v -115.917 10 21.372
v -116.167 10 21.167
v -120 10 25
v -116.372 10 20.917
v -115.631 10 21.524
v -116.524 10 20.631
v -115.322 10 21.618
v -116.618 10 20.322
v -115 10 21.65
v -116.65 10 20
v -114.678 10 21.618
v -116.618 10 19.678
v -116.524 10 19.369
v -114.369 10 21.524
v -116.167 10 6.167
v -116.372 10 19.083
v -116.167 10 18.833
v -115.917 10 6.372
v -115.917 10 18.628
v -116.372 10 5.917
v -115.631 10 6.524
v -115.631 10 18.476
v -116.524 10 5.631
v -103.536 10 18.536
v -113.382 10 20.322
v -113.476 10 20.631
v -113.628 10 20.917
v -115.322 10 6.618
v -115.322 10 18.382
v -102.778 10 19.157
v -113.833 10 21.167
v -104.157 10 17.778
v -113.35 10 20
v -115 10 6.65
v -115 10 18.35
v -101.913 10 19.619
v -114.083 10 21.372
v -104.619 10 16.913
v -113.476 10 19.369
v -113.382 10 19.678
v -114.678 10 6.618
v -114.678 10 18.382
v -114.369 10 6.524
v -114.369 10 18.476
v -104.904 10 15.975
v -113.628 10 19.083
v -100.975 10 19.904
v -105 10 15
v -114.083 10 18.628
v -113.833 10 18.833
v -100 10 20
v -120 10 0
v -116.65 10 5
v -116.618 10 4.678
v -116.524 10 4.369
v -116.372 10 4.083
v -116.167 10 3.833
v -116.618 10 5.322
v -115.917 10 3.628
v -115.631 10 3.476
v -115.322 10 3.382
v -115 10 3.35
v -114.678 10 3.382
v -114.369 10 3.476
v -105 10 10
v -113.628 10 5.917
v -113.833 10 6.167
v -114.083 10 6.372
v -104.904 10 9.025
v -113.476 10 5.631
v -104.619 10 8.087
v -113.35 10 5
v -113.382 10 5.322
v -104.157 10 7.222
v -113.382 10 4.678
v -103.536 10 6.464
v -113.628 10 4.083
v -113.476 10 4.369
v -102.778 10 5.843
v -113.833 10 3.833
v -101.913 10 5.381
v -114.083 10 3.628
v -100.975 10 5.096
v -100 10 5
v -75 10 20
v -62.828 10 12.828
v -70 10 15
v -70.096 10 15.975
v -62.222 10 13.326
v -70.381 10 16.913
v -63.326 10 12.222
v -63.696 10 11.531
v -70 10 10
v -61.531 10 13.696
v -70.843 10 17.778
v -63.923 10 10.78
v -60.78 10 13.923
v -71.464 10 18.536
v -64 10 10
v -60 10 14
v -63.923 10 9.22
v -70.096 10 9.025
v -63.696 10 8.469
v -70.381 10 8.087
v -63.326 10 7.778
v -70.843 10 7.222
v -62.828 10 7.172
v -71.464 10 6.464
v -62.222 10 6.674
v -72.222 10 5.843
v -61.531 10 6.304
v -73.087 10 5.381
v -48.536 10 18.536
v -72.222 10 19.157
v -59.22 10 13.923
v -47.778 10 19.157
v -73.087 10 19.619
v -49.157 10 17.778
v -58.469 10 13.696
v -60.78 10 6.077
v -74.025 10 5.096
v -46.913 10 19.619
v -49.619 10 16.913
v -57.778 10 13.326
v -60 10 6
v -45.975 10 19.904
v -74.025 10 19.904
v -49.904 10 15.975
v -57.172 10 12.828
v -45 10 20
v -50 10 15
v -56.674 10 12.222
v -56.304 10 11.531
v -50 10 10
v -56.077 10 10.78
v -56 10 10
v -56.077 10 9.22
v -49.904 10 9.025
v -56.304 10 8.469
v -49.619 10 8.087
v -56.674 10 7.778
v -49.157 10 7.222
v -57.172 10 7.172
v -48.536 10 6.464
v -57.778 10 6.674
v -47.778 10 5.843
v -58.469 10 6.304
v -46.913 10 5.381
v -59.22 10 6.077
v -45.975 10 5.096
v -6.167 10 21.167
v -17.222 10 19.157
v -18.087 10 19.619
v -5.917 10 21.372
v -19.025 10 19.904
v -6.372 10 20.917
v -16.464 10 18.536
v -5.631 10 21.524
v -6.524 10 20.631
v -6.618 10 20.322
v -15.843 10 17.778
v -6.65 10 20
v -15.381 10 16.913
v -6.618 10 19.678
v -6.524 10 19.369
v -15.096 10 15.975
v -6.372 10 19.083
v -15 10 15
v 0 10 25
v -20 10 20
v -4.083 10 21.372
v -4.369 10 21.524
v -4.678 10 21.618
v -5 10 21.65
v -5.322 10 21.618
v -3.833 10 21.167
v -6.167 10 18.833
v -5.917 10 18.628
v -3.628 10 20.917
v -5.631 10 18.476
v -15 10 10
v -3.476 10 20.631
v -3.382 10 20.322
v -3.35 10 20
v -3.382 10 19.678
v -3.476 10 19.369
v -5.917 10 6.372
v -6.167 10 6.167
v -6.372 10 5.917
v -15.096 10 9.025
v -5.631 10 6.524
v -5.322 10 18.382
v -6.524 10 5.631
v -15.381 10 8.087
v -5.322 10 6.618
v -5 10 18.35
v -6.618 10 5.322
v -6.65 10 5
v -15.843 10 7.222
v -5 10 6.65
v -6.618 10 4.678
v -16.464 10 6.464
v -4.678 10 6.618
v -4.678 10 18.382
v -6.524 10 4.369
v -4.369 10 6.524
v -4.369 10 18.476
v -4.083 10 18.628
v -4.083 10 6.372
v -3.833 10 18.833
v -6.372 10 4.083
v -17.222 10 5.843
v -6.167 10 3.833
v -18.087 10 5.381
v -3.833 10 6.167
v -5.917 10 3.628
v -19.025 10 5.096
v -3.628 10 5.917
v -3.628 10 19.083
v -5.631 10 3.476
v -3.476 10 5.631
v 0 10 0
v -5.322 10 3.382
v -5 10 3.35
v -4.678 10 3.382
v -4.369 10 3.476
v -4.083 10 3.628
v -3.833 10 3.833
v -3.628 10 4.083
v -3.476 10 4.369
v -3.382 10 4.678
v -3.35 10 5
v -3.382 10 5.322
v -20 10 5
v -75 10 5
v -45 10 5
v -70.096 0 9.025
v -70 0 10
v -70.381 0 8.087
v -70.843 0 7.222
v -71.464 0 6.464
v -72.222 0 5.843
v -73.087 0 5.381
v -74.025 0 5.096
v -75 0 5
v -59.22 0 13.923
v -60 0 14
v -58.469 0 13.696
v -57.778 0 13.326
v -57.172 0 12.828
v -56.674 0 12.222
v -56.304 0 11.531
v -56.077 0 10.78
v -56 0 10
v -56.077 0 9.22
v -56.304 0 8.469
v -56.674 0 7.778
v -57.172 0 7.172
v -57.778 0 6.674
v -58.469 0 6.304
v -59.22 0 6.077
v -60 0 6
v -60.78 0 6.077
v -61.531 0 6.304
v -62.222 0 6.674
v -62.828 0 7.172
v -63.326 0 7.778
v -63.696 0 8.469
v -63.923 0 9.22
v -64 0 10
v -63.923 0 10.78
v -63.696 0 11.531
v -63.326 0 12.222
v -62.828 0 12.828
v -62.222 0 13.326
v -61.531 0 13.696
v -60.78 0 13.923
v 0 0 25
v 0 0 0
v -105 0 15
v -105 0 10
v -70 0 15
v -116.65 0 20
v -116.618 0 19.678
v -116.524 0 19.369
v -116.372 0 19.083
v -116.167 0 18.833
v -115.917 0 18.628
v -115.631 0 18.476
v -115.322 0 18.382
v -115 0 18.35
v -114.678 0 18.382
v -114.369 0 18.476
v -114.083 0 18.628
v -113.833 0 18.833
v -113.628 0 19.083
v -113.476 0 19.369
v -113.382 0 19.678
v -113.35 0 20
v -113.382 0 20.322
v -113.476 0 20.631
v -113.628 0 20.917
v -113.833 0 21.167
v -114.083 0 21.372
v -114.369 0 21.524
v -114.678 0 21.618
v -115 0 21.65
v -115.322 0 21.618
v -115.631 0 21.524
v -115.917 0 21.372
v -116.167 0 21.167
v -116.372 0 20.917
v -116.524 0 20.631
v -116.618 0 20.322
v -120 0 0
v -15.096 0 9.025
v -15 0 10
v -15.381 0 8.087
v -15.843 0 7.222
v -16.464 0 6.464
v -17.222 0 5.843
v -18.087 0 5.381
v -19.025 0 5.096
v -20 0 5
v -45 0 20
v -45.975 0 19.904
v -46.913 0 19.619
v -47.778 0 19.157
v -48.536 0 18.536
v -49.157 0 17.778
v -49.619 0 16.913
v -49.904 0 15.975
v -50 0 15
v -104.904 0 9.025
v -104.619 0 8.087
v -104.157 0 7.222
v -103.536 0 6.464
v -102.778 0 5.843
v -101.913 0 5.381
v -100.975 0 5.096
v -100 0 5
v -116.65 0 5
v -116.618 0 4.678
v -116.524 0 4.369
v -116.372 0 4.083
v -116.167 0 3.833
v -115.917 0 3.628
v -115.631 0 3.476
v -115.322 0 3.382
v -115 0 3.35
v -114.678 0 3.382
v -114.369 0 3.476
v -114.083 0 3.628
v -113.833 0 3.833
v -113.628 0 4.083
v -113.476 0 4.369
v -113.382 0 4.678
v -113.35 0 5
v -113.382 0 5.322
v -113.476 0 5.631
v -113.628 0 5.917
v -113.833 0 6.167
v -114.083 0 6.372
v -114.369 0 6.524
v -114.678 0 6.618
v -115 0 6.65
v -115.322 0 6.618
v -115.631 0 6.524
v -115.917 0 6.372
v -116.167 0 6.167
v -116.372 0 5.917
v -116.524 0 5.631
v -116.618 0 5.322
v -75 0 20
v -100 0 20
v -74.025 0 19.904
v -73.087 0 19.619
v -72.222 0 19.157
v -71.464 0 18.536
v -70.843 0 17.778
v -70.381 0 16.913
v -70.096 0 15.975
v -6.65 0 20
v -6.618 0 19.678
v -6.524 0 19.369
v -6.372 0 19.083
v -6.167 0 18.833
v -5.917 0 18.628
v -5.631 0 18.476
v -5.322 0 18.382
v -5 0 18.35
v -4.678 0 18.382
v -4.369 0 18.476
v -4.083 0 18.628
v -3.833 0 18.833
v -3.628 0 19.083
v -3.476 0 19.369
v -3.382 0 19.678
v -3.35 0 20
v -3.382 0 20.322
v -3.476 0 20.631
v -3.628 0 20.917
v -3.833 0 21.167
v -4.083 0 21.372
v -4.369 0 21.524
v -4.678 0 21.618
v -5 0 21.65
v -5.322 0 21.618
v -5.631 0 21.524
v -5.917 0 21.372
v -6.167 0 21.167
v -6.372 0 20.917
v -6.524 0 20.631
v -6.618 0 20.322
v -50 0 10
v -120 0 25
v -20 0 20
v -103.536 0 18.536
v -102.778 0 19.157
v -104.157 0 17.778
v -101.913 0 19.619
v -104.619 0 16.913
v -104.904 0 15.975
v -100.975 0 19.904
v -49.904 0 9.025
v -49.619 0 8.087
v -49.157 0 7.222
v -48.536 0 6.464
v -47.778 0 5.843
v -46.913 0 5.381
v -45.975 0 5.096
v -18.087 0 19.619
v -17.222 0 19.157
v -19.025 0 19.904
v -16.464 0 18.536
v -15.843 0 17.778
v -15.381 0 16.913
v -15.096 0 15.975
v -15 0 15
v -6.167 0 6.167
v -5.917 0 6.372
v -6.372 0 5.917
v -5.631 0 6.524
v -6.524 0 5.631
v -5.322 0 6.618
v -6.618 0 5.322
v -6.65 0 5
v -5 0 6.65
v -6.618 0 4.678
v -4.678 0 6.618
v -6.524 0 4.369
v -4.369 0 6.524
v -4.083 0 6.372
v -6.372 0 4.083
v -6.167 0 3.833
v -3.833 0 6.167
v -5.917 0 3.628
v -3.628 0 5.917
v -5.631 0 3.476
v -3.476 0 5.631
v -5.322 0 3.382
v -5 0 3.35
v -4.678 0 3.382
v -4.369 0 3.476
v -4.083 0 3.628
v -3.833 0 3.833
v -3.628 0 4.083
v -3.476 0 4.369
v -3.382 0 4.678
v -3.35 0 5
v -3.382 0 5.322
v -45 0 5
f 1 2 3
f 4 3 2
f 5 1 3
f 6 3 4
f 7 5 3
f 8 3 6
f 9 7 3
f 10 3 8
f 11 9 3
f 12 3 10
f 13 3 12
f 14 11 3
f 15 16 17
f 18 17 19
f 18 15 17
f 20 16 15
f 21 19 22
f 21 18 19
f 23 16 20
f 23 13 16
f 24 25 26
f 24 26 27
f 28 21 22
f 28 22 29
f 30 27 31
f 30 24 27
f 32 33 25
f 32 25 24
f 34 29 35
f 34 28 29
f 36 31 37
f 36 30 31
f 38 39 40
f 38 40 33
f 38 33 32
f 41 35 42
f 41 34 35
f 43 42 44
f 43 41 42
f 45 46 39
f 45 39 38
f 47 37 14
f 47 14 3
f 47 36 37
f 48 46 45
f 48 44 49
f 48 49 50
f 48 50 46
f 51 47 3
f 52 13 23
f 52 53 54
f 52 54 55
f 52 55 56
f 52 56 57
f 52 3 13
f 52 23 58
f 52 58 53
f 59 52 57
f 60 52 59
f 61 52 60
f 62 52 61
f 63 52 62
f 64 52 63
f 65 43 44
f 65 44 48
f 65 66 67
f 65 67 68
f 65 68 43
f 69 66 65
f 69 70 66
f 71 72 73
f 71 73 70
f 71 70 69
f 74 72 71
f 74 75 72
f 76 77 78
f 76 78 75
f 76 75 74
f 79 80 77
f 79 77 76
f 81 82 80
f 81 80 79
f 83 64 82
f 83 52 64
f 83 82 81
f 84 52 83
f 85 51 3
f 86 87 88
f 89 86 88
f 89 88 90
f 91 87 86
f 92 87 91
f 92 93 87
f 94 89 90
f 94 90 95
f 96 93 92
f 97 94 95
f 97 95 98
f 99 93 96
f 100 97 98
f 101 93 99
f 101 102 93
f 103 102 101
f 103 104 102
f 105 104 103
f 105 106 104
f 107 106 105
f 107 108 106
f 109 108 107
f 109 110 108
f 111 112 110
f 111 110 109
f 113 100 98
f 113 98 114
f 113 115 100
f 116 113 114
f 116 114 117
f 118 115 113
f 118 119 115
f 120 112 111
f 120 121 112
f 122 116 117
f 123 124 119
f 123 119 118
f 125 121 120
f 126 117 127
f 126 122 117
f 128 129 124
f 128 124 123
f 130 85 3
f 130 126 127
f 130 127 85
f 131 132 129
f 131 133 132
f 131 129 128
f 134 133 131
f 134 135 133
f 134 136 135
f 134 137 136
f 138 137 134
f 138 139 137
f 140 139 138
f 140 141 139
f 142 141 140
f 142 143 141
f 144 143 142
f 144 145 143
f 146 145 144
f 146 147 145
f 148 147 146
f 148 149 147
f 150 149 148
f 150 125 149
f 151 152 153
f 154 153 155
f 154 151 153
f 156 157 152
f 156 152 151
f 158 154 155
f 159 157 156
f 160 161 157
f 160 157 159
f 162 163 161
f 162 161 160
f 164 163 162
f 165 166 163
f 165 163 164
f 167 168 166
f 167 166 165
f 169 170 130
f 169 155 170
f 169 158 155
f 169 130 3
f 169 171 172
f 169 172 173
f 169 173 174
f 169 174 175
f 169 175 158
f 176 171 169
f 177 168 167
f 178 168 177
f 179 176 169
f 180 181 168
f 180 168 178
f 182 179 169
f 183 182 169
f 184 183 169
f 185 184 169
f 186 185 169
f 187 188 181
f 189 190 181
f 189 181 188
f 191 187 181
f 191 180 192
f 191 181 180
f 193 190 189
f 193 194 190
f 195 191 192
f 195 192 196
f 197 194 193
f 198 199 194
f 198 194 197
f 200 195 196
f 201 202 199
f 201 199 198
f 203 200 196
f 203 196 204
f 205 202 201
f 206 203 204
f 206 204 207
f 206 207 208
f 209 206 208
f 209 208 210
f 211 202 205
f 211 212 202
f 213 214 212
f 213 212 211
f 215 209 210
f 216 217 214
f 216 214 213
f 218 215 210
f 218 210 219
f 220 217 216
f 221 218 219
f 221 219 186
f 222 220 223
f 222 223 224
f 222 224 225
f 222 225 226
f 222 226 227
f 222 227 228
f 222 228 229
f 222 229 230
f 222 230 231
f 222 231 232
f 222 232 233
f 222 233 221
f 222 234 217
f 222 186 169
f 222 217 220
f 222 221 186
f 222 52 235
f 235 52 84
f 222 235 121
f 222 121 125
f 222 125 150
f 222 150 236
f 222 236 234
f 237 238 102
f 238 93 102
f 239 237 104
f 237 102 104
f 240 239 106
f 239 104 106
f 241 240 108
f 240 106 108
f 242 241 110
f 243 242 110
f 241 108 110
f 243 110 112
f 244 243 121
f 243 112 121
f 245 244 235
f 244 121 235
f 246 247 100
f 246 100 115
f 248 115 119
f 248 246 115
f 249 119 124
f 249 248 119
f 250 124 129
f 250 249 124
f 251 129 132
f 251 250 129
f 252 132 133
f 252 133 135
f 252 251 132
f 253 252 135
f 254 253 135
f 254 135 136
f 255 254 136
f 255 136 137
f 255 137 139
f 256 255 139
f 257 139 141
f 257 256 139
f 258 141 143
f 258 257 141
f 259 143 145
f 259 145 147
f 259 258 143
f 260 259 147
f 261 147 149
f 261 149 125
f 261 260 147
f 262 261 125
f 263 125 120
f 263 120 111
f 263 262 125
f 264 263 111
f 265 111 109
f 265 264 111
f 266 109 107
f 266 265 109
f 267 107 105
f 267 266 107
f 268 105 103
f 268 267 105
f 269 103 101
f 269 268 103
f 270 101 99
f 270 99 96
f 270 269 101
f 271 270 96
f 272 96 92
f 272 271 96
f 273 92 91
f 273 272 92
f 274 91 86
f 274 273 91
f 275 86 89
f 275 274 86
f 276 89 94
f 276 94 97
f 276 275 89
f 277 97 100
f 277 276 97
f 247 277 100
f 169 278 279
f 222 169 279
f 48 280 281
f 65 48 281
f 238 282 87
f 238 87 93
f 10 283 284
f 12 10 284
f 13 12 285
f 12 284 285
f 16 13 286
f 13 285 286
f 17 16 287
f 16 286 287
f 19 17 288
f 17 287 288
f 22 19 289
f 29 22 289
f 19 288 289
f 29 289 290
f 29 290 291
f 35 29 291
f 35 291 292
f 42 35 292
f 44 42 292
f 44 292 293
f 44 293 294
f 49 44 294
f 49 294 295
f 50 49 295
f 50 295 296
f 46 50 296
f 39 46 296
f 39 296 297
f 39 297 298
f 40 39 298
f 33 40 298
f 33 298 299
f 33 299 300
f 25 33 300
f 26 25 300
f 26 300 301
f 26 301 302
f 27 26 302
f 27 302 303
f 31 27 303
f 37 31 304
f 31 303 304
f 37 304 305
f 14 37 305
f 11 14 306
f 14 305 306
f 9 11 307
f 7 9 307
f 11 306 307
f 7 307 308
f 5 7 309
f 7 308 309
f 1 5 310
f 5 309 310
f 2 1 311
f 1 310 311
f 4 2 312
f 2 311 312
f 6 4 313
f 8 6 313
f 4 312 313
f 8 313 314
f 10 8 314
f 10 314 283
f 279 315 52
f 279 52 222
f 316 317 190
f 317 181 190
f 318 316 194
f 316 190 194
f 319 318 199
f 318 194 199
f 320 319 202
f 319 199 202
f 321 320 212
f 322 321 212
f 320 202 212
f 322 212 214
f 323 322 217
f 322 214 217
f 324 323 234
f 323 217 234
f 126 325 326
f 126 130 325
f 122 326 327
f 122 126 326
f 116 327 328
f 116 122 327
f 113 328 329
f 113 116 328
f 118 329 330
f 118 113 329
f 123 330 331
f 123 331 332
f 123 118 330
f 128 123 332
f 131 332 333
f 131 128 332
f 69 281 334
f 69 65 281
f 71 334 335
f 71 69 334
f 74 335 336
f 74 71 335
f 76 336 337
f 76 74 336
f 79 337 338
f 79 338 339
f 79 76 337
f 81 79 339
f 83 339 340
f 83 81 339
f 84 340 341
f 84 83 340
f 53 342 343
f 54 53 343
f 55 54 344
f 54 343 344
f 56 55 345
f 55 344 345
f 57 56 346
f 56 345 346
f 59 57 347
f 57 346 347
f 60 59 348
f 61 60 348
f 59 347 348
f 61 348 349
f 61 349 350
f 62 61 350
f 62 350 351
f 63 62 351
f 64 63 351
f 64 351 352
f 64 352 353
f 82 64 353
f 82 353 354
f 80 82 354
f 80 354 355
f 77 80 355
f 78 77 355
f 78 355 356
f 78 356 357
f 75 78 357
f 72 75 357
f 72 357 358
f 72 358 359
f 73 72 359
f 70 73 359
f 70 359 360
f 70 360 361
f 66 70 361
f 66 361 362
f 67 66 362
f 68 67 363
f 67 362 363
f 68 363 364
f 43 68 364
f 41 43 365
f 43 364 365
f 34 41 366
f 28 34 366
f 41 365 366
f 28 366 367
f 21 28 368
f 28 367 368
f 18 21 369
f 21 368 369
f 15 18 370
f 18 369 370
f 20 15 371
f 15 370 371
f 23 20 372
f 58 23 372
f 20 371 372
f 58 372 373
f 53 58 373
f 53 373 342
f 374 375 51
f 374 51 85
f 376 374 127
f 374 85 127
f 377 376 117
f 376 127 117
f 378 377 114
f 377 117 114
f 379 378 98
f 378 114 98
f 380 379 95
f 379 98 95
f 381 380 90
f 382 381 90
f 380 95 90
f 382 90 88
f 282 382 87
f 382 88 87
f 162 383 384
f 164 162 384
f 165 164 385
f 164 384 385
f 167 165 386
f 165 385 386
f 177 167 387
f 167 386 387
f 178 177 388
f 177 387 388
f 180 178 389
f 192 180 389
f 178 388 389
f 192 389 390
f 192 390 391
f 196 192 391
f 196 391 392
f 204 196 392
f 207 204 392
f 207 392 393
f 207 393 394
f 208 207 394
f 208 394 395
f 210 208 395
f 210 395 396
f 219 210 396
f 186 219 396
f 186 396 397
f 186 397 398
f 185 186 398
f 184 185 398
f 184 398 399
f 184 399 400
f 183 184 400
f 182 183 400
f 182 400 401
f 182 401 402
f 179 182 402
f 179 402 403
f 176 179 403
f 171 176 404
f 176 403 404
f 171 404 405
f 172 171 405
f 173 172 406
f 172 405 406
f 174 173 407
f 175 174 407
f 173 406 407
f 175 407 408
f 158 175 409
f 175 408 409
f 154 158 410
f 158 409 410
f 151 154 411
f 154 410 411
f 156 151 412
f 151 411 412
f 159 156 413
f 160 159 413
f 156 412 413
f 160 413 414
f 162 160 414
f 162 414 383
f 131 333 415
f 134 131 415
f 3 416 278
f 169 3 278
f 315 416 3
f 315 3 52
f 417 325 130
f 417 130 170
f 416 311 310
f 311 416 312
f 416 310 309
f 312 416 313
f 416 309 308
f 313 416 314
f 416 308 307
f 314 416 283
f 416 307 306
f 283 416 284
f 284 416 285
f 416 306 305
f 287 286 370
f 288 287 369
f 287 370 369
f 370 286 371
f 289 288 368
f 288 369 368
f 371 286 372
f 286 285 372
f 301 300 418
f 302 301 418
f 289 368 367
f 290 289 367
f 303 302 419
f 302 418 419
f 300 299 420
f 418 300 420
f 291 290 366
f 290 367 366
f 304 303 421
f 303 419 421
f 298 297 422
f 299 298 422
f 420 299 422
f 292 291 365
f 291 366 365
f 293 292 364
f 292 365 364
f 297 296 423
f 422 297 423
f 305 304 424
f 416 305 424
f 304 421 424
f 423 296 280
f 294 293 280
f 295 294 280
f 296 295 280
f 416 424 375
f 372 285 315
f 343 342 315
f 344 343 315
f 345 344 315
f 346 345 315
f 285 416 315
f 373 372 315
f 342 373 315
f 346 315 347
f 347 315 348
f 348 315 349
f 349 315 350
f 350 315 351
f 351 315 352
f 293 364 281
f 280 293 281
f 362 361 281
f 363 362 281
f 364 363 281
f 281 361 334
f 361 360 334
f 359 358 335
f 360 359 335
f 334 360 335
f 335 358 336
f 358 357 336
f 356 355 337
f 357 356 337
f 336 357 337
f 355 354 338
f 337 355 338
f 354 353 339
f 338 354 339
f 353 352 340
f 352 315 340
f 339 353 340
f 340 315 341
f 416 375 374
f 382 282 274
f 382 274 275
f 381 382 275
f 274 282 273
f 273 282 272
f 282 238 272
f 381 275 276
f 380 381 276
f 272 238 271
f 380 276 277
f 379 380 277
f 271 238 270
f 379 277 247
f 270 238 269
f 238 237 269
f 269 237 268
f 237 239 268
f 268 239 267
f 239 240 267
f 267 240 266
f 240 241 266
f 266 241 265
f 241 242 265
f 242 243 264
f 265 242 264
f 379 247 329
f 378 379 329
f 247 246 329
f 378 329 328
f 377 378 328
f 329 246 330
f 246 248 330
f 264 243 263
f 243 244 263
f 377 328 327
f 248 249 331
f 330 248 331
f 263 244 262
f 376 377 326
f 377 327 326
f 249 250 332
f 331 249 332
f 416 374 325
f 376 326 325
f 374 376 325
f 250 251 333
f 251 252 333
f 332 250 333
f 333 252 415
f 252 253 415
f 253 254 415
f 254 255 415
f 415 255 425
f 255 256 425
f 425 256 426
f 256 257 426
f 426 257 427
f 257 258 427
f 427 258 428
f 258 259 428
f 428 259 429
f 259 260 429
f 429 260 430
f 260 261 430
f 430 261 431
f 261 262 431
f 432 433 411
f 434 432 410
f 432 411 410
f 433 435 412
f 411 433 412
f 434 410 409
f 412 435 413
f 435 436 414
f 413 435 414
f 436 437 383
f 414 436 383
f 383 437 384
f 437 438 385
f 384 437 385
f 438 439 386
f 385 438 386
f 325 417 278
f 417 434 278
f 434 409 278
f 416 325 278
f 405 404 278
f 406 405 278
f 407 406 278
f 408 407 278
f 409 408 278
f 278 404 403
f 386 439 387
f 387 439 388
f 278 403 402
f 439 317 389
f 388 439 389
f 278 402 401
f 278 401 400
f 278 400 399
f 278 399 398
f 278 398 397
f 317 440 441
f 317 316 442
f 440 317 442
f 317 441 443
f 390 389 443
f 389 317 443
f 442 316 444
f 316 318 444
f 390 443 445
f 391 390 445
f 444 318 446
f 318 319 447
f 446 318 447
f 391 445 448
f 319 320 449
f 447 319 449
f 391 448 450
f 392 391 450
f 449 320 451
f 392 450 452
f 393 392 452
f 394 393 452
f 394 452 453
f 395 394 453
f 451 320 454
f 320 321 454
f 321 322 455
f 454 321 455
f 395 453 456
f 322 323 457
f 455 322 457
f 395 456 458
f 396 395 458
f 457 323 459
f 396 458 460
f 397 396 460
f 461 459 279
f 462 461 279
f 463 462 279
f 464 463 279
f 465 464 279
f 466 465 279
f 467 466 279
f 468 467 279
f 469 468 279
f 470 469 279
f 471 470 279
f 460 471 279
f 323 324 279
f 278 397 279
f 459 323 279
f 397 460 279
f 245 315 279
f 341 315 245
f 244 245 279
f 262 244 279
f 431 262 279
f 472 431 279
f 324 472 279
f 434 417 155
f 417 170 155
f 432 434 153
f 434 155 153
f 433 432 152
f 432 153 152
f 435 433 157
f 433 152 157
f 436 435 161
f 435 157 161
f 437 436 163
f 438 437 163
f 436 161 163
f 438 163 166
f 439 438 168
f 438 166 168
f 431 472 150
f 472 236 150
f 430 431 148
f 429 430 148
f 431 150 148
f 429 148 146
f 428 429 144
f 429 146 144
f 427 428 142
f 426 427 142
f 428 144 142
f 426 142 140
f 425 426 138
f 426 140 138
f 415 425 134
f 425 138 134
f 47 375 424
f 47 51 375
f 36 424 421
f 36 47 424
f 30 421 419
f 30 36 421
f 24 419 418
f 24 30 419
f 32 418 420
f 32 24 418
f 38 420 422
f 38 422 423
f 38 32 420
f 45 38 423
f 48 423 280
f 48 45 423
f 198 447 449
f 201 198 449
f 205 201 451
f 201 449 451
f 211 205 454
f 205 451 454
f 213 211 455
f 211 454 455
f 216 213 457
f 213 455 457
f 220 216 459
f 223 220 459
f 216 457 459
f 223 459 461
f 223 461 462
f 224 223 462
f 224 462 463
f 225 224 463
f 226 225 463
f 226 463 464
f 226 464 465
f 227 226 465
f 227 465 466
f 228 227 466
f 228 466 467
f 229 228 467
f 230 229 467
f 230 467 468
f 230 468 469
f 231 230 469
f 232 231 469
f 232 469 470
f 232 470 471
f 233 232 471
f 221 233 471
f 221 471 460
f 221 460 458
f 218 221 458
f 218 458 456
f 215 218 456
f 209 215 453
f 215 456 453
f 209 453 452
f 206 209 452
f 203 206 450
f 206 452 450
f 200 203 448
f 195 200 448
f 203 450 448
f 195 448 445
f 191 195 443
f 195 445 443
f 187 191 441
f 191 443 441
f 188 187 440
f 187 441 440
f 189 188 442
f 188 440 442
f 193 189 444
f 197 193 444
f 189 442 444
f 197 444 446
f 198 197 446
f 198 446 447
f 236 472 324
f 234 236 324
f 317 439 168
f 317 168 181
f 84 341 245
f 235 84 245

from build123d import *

# Parameters (mm, degrees)
SKETCH1_W             = 119.999999984
SKETCH1_H             = 25.000000005
SKETCH1_R             = 4
SKETCH1_W_2           = 34.999999984
SKETCH1_H_2           = 15.000000005
SKETCH1_W_3           = 35.000000016
BOSS_EXTRUDE1_DEPTH   = 10
FILLET1_R             = 5
M4X0_7_TAPPED_HOLE1_D = 3.3


with BuildPart() as part:
    # Sketch1 → Boss-Extrude1 (new body)
    with BuildSketch(Plane(origin=(0, 0, 0), x_dir=(1, 0, 0), z_dir=(0, 1, 0))):
        with Locations((-59.999999992, -12.500000003)):
            Rectangle(SKETCH1_W, SKETCH1_H)
        with Locations(Location((-60, -10, 0), (0, 0, 270))):
            Circle(SKETCH1_R, mode=Mode.SUBTRACT)
        with Locations((-87.499999992, -12.500000003)):
            Rectangle(SKETCH1_W_2, SKETCH1_H_2, mode=Mode.SUBTRACT)
        with Locations((-32.499999992, -12.500000003)):
            Rectangle(SKETCH1_W_3, SKETCH1_H_2, mode=Mode.SUBTRACT)
    extrude(amount=BOSS_EXTRUDE1_DEPTH)

    # Fillet1
    fillet1_edges = [part.edges().sort_by_distance(p)[0] for p in [
        (-14.999999984, 5, 20.000000005),
        (-14.999999984, 5, 5),
        (-50, 5, 5),
        (-50, 5, 20.000000005),
        (-104.999999984, 5, 5),
        (-104.999999984, 5, 20.000000005),
        (-70, 5, 20.000000005),
        (-70, 5, 5),
    ]]
    fillet(fillet1_edges, radius=FILLET1_R)

    # M4x0.7 Tapped Hole1 (through all)
    with Locations(Plane(origin=(0, 10, 0), x_dir=(1, 0, 0), z_dir=(0, 1, 0))):
        with Locations((-115, -5), (-115, -20.000000005), (-5, -5), (-5, -20.000000005)):
            Hole(M4X0_7_TAPPED_HOLE1_D / 2)


solid = part.part
